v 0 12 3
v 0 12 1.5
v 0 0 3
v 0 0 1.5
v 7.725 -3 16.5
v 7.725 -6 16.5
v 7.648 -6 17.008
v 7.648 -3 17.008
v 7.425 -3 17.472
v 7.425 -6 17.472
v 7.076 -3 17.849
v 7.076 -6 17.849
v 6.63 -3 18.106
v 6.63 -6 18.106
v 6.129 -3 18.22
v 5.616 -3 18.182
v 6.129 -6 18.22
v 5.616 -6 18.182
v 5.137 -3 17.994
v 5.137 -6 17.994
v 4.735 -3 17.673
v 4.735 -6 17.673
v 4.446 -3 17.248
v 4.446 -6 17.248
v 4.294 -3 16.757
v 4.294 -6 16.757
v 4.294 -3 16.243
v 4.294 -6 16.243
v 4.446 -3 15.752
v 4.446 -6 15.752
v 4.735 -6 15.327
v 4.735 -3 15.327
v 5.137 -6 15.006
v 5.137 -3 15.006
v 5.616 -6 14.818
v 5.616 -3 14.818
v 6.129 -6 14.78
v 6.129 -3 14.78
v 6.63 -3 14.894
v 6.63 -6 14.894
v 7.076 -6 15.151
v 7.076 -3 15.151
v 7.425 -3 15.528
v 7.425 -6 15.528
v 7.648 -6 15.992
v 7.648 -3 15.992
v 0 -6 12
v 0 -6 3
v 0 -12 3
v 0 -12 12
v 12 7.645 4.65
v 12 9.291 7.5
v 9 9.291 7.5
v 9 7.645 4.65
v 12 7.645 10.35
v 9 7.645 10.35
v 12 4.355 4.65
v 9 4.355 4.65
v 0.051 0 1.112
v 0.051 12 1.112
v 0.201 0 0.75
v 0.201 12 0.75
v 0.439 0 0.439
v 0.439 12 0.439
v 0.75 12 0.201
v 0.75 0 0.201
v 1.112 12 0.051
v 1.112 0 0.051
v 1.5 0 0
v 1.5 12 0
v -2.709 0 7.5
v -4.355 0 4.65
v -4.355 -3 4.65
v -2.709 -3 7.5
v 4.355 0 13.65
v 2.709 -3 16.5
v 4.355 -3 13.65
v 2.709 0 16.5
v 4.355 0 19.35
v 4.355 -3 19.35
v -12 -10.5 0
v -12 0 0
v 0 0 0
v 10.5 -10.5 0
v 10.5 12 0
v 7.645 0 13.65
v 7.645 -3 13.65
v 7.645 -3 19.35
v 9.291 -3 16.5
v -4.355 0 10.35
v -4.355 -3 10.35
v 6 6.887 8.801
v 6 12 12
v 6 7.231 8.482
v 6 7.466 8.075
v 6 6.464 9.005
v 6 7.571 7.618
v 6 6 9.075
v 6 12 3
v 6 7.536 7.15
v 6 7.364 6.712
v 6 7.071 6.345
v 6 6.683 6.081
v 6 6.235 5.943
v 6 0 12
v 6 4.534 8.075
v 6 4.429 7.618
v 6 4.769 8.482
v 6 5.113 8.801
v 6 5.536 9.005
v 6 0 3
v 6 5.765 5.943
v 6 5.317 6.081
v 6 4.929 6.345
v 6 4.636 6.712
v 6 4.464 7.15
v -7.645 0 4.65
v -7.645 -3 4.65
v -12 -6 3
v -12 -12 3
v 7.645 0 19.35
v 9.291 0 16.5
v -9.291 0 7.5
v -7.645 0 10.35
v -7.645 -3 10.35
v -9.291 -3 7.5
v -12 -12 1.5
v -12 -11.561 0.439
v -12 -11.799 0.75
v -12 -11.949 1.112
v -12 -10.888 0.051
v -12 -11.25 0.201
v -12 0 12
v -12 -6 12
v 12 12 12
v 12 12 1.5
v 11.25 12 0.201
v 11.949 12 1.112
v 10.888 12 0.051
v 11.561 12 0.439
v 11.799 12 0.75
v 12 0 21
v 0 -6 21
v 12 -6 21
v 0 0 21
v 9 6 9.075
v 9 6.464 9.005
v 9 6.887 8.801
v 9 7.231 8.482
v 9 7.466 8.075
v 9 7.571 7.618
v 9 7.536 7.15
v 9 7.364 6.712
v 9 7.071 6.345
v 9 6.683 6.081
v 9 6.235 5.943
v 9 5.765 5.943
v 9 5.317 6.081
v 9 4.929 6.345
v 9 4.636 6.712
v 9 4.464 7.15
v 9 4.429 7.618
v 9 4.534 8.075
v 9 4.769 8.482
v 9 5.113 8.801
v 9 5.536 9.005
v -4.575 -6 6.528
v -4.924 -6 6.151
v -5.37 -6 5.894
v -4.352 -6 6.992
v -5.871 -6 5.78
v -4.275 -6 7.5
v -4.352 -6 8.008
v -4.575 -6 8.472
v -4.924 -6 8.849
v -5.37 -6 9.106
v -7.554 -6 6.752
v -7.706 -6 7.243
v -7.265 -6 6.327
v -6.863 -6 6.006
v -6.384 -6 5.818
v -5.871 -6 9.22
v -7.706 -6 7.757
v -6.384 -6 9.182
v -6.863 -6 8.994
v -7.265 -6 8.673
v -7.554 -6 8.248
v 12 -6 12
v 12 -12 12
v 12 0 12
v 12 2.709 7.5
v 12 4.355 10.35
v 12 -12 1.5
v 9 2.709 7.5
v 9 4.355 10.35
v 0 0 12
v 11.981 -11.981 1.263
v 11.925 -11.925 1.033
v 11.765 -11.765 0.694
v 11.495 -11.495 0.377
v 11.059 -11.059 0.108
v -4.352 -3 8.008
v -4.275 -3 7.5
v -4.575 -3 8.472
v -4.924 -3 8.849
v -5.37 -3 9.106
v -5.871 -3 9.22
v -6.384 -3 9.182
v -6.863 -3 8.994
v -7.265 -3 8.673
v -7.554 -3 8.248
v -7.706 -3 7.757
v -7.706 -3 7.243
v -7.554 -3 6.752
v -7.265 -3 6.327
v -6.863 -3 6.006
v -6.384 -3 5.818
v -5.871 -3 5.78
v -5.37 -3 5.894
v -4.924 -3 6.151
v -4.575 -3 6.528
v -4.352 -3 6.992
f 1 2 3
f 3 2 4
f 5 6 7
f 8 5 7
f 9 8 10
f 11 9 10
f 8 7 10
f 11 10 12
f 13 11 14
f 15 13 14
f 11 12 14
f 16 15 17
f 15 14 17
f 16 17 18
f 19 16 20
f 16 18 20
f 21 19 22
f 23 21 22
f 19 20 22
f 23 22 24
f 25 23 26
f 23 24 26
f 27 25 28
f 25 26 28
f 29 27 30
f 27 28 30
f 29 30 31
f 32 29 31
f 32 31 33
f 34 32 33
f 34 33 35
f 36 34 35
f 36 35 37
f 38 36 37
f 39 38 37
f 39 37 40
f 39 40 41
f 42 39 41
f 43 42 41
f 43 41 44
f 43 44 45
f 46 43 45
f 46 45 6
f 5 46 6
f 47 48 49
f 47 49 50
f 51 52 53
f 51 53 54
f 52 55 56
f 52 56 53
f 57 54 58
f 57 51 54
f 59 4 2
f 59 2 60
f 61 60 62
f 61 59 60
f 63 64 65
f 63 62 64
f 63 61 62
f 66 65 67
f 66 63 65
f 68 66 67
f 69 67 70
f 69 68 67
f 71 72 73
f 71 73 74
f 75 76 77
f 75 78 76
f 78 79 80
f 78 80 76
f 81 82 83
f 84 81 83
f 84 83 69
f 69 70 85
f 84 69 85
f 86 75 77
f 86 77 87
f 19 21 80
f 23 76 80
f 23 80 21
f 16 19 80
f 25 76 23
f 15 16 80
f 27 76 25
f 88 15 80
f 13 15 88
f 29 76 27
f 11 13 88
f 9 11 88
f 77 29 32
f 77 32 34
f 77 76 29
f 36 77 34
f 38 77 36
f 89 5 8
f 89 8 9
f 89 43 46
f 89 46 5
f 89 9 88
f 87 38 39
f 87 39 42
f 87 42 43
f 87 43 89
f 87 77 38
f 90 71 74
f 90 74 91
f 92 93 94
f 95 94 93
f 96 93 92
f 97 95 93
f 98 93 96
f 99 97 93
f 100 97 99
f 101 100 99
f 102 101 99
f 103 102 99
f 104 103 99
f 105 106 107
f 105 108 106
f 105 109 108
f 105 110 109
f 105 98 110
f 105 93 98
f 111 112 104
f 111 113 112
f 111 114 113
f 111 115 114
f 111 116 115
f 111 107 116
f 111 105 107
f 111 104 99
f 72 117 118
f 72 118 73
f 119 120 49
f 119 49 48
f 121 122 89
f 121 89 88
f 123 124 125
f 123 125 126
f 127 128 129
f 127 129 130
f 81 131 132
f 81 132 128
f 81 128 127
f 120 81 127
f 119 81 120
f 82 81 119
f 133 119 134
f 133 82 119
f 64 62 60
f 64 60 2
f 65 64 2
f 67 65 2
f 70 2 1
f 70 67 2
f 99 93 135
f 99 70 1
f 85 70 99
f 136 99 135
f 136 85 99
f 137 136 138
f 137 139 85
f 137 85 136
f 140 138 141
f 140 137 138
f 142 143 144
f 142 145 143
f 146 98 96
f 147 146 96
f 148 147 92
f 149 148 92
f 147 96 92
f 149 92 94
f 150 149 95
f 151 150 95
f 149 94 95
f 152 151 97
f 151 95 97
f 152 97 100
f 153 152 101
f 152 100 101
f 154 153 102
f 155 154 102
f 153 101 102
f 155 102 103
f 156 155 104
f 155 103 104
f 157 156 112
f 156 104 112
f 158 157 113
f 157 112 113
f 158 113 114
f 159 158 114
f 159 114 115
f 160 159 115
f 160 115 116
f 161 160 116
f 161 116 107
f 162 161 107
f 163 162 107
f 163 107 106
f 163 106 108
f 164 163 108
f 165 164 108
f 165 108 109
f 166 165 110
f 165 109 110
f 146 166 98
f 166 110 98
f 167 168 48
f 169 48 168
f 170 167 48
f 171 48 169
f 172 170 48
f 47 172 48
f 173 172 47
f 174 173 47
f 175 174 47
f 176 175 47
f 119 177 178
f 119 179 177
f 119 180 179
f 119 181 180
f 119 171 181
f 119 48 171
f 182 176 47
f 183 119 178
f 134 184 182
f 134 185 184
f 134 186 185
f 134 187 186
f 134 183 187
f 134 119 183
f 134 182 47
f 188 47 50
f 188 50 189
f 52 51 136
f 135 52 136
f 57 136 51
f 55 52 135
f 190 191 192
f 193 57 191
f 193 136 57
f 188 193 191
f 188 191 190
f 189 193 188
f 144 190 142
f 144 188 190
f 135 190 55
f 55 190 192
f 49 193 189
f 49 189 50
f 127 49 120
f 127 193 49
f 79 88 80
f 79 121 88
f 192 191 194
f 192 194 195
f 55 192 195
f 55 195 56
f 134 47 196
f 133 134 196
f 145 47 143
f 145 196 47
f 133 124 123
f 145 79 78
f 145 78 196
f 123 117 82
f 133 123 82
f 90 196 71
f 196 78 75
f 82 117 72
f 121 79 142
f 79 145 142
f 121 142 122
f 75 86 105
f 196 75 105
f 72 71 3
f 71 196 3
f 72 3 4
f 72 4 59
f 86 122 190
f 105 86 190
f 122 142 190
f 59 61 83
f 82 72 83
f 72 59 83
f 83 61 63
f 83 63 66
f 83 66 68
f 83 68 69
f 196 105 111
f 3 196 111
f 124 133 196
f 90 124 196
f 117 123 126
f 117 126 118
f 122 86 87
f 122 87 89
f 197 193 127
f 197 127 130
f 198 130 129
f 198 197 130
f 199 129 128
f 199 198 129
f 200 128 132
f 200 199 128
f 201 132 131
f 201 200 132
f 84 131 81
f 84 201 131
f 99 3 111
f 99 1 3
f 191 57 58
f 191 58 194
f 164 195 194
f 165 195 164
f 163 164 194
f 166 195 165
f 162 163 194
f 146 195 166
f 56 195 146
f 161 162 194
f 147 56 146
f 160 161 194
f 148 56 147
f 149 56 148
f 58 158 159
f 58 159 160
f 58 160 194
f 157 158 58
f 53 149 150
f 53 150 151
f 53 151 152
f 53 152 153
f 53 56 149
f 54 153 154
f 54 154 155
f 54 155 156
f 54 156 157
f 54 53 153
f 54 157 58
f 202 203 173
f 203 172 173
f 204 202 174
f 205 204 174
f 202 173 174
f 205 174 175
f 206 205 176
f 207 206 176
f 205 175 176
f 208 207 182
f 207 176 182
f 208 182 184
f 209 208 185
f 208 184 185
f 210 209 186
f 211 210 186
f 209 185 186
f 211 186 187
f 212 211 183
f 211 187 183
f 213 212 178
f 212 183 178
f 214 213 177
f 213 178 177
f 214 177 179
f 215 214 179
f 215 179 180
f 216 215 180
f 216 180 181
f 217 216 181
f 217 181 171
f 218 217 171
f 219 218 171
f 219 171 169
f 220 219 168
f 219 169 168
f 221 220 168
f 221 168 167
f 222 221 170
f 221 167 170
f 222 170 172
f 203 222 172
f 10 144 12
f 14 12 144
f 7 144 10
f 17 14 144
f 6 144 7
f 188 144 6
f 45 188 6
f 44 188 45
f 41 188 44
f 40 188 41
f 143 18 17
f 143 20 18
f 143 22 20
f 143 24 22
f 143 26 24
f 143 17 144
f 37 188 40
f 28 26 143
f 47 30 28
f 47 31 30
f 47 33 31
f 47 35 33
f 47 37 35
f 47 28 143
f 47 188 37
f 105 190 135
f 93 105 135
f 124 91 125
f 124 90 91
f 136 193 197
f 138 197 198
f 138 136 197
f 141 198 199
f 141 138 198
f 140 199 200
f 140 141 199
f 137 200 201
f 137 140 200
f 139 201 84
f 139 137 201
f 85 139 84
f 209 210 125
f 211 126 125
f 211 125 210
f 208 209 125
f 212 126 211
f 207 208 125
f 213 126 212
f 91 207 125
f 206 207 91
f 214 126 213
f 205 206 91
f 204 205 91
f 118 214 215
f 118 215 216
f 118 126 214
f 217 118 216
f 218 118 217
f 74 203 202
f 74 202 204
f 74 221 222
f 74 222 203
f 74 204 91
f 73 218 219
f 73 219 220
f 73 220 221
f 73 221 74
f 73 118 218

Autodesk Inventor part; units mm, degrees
ref_plane "YZ Plane" through (0, 0, 0) normal (1, 0, 0) x (0, 1, 0)
ref_plane "XZ Plane" through (0, 0, 0) normal (0, 1, 0) x (-1, 0, 0)
ref_plane "XY Plane" through (0, 0, 0) normal (0, 0, 1) x (1, 0, 0)
sketch "Sketch1" plane through (0, 0, 0) normal (0, 0, 1) x (1, 0, 0)
  line L0 (0, 0) -> (12, 0)
  line L1 (12, 0) -> (12, 12)
  line L2 (12, 12) -> (0, 12)
  line L3 (0, 12) -> (0, 0)
  line L4 (12, 0) -> (0, 0)
  line L5 (0, 0) -> (0, -12)
  line L6 (0, -12) -> (12, -12)
  line L7 (12, -12) -> (12, 0)
  line L8 (12, 0) -> (24, 0)
  line L9 (24, 0) -> (24, -12)
  line L10 (24, -12) -> (12, -12)
  line L11 (12, -12) -> (12, 0)
  line L12 (0, -12) -> (-12, -12)
  line L13 (-12, -12) -> (-12, 0)
  line L14 (-12, 0) -> (0, 0)
  line L15 (0, 0) -> (0, -12)
  line L16 (0, -12) -> (12, -12)
  line L17 (12, -12) -> (12, -24)
  line L18 (12, -24) -> (0, -24)
  line L19 (0, -24) -> (0, -12)
  dimension "d0" = 12
  dimension "d1" = 12
  dimension "d2" = 12
  dimension "d3" = 12
  dimension "d4" = 12
  dimension "d5" = 12
  dimension "d6" = 12
  dimension "d7" = 12
  dimension "d8" = 12
  dimension "d9" = 12
extrude "Extrusion1" add sketch "Sketch1" along normal blind 3
sketch "Sketch2" plane through (0, 0, 3) normal (0, 0, 1) x (1, 0, 0)
  line L0 (-12, 0) -> (-12, -12) projected
  line L1 (-12, -12) -> (-12, -6)
  line L2 (-12, -6) -> (0, -6)
  line L3 (-12, -12) -> (0, -12) projected
  line L4 (0, -6) -> (0, -12)
  line L5 (0, -12) -> (-12, -12)
  line L6 (12, -24) -> (12, -12) projected
  line L7 (12, -12) -> (12, -6)
  line L8 (12, -6) -> (24, -6)
  line L9 (24, -12) -> (24, 0) projected
  line L10 (12, -12) -> (24, -12) projected
  line L11 (24, -6) -> (24, -12)
  line L12 (24, -12) -> (12, -12)
  line L13 (0, 0) -> (0, -6)
  line L14 (12, 0) -> (12, 12) projected
  line L15 (0, 0) -> (12, 0)
  line L16 (12, 0) -> (12, -6)
  line L17 (12, -12) -> (0, -12)
  line L18 (0, 12) -> (0, 0) projected
  line L19 (0, 0) -> (0, 12)
  line L20 (0, 12) -> (6, 12)
  line L21 (12, 12) -> (0, 12) projected
  line L22 (6, 12) -> (6, 0)
  line L23 (6, 0) -> (0, 0)
  line L24 (0, -12) -> (0, -24) projected
  line L25 (0, -12) -> (0, -24)
  line L26 (0, -24) -> (6, -24)
  line L27 (0, -24) -> (12, -24) projected
  line L28 (6, -24) -> (6, -12)
  line L29 (6, -12) -> (0, -12)
  dimension "d12" = 6
  dimension "d13" = 12
extrude "Extrusion2" add sketch "Sketch2" along normal blind 9 contours L2 L4 L3 L0 | L13 L15 L16 L7 L17 L4 | L17 L28 L26 L24 | L18 L20 L22 L15 | L7 L8 L9 L10
sketch "Sketch3" plane through (0, 0, 12) normal (0, 0, 1) x (1, 0, 0)
  line L0 (0, -6) -> (12, -6)
  line L1 (12, -12) -> (6, -12) projected
  line L2 (12, -6) -> (12, -12)
  line L3 (0, -12) -> (0, -24) projected
  line L4 (12, -12) -> (0, -12)
  line L5 (0, -12) -> (0, -6)
  point P0 (0, 0)
extrude "Extrusion3" add sketch "Sketch3" along normal blind 9
sketch "Sketch4" plane through (6, -12, 3) normal (0, -1, 0) x (1, 0, 0)
  point P0 (-6, -3)
sketch "Sketch5" plane through (-12, -6, 3) normal (0, 1, 0) x (1, 0, 0)
  circle A0 centre (6, -4.5) radius 1.725
  line L0 (0, 0) -> (0, -9) projected
  line L1 (12, -9) -> (0, -9) projected
  circle A1 centre (18, -13.5) radius 1.725
  line L2 (24, -18) -> (12, -18) projected
  line L3 (24, -9) -> (24, -18) projected
  circle A2 centre (30, -4.5) radius 1.725
  line L4 (36, 0) -> (36, -9) projected
  line L5 (36, -9) -> (24, -9) projected
  point P0 (12, 3)
  dimension "d19" = 3.45
  dimension "d20" = 6
  dimension "d21" = 4.5
  dimension "d22" = 3.45
  dimension "d23" = 4.5
  dimension "d24" = 6
  dimension "d25" = 3.45
  dimension "d26" = 6
  dimension "d27" = 4.5
extrude "Extrusion4" cut sketch "Sketch5" against normal blind 3
sketch "Sketch6" plane through (6, -12, 3) normal (0, -1, 0) x (1, 0, 0)
  circle A0 centre (-12, 4.5) radius 1.725 projected
  line L0 (-10.3546, 7.35) -> (-8.7091, 4.5)
  line L1 (-8.7091, 4.5) -> (-10.3546, 1.65)
  line L2 (-10.3546, 1.65) -> (-13.6454, 1.65)
  line L3 (-13.6454, 1.65) -> (-15.2909, 4.5)
  line L4 (-15.2909, 4.5) -> (-13.6454, 7.35)
  line L5 (-13.6454, 7.35) -> (-10.3546, 7.35)
  circle A1 centre (12, 4.5) radius 1.725 projected
  line L6 (13.6454, 7.35) -> (15.2909, 4.5)
  line L7 (15.2909, 4.5) -> (13.6454, 1.65)
  line L8 (13.6454, 1.65) -> (10.3546, 1.65)
  line L9 (10.3546, 1.65) -> (8.7091, 4.5)
  line L10 (8.7091, 4.5) -> (10.3546, 7.35)
  line L11 (10.3546, 7.35) -> (13.6454, 7.35)
  circle A2 centre (0, 13.5) radius 1.725 projected
  line L12 (1.6454, 16.35) -> (3.2909, 13.5)
  line L13 (3.2909, 13.5) -> (1.6454, 10.65)
  line L14 (1.6454, 10.65) -> (-1.6454, 10.65)
  line L15 (-1.6454, 10.65) -> (-3.2909, 13.5)
  line L16 (-3.2909, 13.5) -> (-1.6454, 16.35)
  line L17 (-1.6454, 16.35) -> (1.6454, 16.35)
  point P0 (-6, -3)
  dimension "d30" = 2.85
  dimension "d31" = 2.85
  dimension "d32" = 2.85
extrude "Extrusion5" cut sketch "Sketch6" against normal blind 3 contours A0 | L0 L1 L2 L3 L4 L5 | A1 | L6 L7 L8 L9 L10 L11 | A2 | L12 L13 L14 L15 L16 L17
sketch "Sketch7" plane through (6, 0, 3) normal (1, 0, 0) x (0, 0, -1)
  circle A0 centre (-4.5, 6) radius 1.725
  circle A1 centre (-4.5, -18) radius 1.725
  line L0 (-9, 0) -> (-9, 12) projected
  line L1 (-9, -24) -> (-9, -12) projected
  line L2 (0, -24) -> (-9, -24) projected
  line L3 (0, 12) -> (-9, 12) projected
  point P0 (3, 0)
  dimension "d35" = 3.45
  dimension "d36" = 3.45
  dimension "d37" = 4.5
  dimension "d38" = 4.5
  dimension "d39" = 6
  dimension "d40" = 6
extrude "Extrusion6" cut sketch "Sketch7" against normal blind 3
sketch "Sketch8" plane through (0, -6, 3) normal (-1, 0, 0) x (0, 0, 1)
  circle A0 centre (4.5, 12) radius 1.725 projected
  line L0 (1.65, 13.6454) -> (4.5, 15.2909)
  line L1 (4.5, 15.2909) -> (7.35, 13.6454)
  line L2 (7.35, 13.6454) -> (7.35, 10.3546)
  line L3 (7.35, 10.3546) -> (4.5, 8.7091)
  line L4 (4.5, 8.7091) -> (1.65, 10.3546)
  line L5 (1.65, 10.3546) -> (1.65, 13.6454)
  circle A1 centre (4.5, -12) radius 1.725 projected
  line L6 (1.65, -10.3546) -> (4.5, -8.7091)
  line L7 (4.5, -8.7091) -> (7.35, -10.3546)
  line L8 (7.35, -10.3546) -> (7.35, -13.6454)
  line L9 (7.35, -13.6454) -> (4.5, -15.2909)
  line L10 (4.5, -15.2909) -> (1.65, -13.6454)
  line L11 (1.65, -13.6454) -> (1.65, -10.3546)
  point P0 (-3, 6)
  dimension "d43" = 2.85
  dimension "d44" = 2.85
extrude "Extrusion7" cut sketch "Sketch8" against normal blind 3 contours A0 | L0 L1 L2 L3 L4 L5 | A1 | L6 L7 L8 L9 L10 L11
sketch "Sketch9" plane through (0, 0, 0) normal (0, 0, -1) x (-1, 0, 0)
  line L0 (-24, -12) -> (-24, 0) projected
  line L1 (-12, -12) -> (-12, -6) projected
  line L2 (-24, 0) -> (-12, 0)
  line L3 (-12, 0) -> (-12, -12)
  line L4 (-12, -12) -> (-24, -12)
  line L5 (-24, -12) -> (-24, 0)
  line L6 (-12, -12) -> (0, -12)
  line L7 (0, -12) -> (0, -24)
  line L8 (0, -24) -> (-12, -24)
  line L9 (-12, -24) -> (-12, -12)
  point P0 (0, 0)
extrude "Extrusion8" cut sketch "Sketch9" against normal through all
sketch "Sketch10" plane through (0, 12, 12) normal (0, 1, 0) x (1, 0, 0)
  line L0 (6, 0) -> (0, 0) projected
  line L1 (12, 9) -> (6, 9) projected
  line L2 (0, 0) -> (6, 0)
  line L3 (6, 0) -> (6, 9)
  line L4 (6, 9) -> (0, 9)
  line L5 (0, 9) -> (0, 0)
  point P0 (0, 12)
extrude "Extrusion9" cut sketch "Sketch10" against normal blind 12
sketch "Sketch11" plane through (0, 0, 3) normal (0, 1, 0) x (1, 0, 0)
  line L0 (12, 0) -> (12, -9) projected
  line L1 (12, 0) -> (0, 0) projected
  line L2 (12, -9) -> (6, -9)
  line L3 (6, -9) -> (6, 0)
  line L4 (6, 0) -> (12, 0)
  line L5 (12, 0) -> (12, -9)
  point P0 (0, 3)
extrude "Extrusion10" add sketch "Sketch11" along normal blind 12
sketch "Sketch12" plane through (6, 0, 3) normal (-1, 0, 0) x (0, 0, 1)
  circle A0 centre (4.5, 6) radius 1.575
  line L0 (9, 0) -> (9, 12) projected
  line L1 (0, 12) -> (9, 12) projected
  point P0 (-3, 0)
  dimension "d54" = 3.15
  dimension "d55" = 4.5
  dimension "d56" = 6
extrude "Extrusion11" cut sketch "Sketch12" against normal blind 3
sketch "Sketch13" plane through (12, -6, 12) normal (1, 0, 0) x (0, 0, -1)
  circle A0 centre (4.5, 12) radius 1.575 projected
  line L0 (1.65, 13.6454) -> (4.5, 15.2909)
  line L1 (4.5, 15.2909) -> (7.35, 13.6454)
  line L2 (7.35, 13.6454) -> (7.35, 10.3546)
  line L3 (7.35, 10.3546) -> (4.5, 8.7091)
  line L4 (4.5, 8.7091) -> (1.65, 10.3546)
  line L5 (1.65, 10.3546) -> (1.65, 13.6454)
  point P0 (12, 6)
  dimension "d59" = 5.7
extrude "Extrusion12" cut sketch "Sketch13" against normal blind 3 contours A0 | L0 L1 L2 L3 L4 L5
sketch "Sketch14" plane through (0, -6, 3) normal (-1, 0, 0) x (0, 0, 1)
  line L0 (9, 6) -> (0, 6) projected
  line L1 (0, 6) -> (0, 0) projected
  line L2 (9, 6) -> (0, 6)
  line L3 (0, 6) -> (0, 0)
  line L4 (0, 0) -> (9, 0)
  line L5 (9, 0) -> (9, 6)
  point P0 (-3, 6)
extrude "Extrusion13" add sketch "Sketch14" along normal blind 12
sketch "Sketch15" plane through (-12, -12, 0) normal (-1, 0, 0) x (0, 0, 1)
  line L0 (12, 0) -> (12, 6) projected
  line L1 (12, 0) -> (3, 0)
  line L2 (3, 0) -> (3, 6)
  line L3 (3, 6) -> (12, 6)
  line L4 (12, 6) -> (12, 0)
  point P0 (0, 12)
  dimension "d64" = 9
  dimension "d65" = 6
extrude "Extrusion14" cut sketch "Sketch15" against normal blind 12
sketch "Sketch16" plane through (-12, -6, 12) normal (0, -1, 0) x (1, 0, 0)
  circle A0 centre (6, -4.5) radius 1.725
  line L0 (0, -9) -> (0, 0) projected
  line L1 (0, 0) -> (12, 0) projected
  point P0 (12, -12)
  dimension "d68" = 3.45
  dimension "d69" = 6
  dimension "d70" = 4.5
extrude "Extrusion15" cut sketch "Sketch16" against normal blind 3
sketch "Sketch17" plane through (-12, 0, 0) normal (0, 1, 0) x (1, 0, 0)
  circle A0 centre (6, -7.5) radius 1.725 projected
  line L0 (4.3546, -10.35) -> (2.7091, -7.5)
  line L1 (2.7091, -7.5) -> (4.3546, -4.65)
  line L2 (4.3546, -4.65) -> (7.6454, -4.65)
  line L3 (7.6454, -4.65) -> (9.2909, -7.5)
  line L4 (9.2909, -7.5) -> (7.6454, -10.35)
  line L5 (7.6454, -10.35) -> (4.3546, -10.35)
  point P0 (12, 0)
  dimension "d73" = 5.7
extrude "Extrusion16" cut sketch "Sketch17" against normal blind 3 contours A0 | L0 L1 L2 L3 L4 L5
sketch "Sketch18" plane through (0, 0, 12) normal (0, 0, 1) x (1, 0, 0)
  line L0 (12, -6) -> (12, 12) projected
  line L1 (0, 0) -> (12, 0)
  line L2 (12, 0) -> (12, -6)
  line L3 (12, -6) -> (0, -6)
  line L4 (0, -6) -> (0, 0)
extrude "Extrusion17" add sketch "Sketch18" along normal blind 9
sketch "Sketch19" plane through (0, 0, 21) normal (0, 0, 1) x (1, 0, 0)
  line L0 (0, -12) -> (12, -12) projected
  line L1 (12, -12) -> (12, 0) projected
  line L2 (0, -12) -> (12, -12)
  line L3 (12, -12) -> (12, -6)
  line L4 (12, -6) -> (0, -6)
  line L5 (0, -6) -> (0, -12)
  point P0 (0, 0)
extrude "Extrusion18" cut sketch "Sketch19" against normal blind 9
sketch "Sketch20" plane through (0, -6, 21) normal (0, -1, 0) x (1, 0, 0)
  circle A0 centre (6, -4.5) radius 1.725
  line L0 (0, 0) -> (12, 0) projected
  line L1 (0, -9) -> (0, 0) projected
  point P0 (0, -21)
  dimension "d80" = 3.45
  dimension "d81" = 4.5
  dimension "d82" = 6
extrude "Extrusion19" cut sketch "Sketch20" against normal blind 3
sketch "Sketch21" plane through (-12, 0, 0) normal (0, 1, 0) x (1, 0, 0)
  circle A0 centre (18, -16.5) radius 1.725 projected
  line L0 (16.3546, -19.35) -> (14.7091, -16.5)
  line L1 (14.7091, -16.5) -> (16.3546, -13.65)
  line L2 (16.3546, -13.65) -> (19.6454, -13.65)
  line L3 (19.6454, -13.65) -> (21.2909, -16.5)
  line L4 (21.2909, -16.5) -> (19.6454, -19.35)
  line L5 (19.6454, -19.35) -> (16.3546, -19.35)
  point P0 (12, 0)
  dimension "d85" = 5.7
extrude "Extrusion20" cut sketch "Sketch21" against normal blind 3 contours A0 | L0 L1 L2 L3 L4 L5
fillet "Fillet3" radius 1.5 3 edges at (0, -12, 0) (12, 0, 0) (0, 6, 0)
properties part number "topCornSW"
